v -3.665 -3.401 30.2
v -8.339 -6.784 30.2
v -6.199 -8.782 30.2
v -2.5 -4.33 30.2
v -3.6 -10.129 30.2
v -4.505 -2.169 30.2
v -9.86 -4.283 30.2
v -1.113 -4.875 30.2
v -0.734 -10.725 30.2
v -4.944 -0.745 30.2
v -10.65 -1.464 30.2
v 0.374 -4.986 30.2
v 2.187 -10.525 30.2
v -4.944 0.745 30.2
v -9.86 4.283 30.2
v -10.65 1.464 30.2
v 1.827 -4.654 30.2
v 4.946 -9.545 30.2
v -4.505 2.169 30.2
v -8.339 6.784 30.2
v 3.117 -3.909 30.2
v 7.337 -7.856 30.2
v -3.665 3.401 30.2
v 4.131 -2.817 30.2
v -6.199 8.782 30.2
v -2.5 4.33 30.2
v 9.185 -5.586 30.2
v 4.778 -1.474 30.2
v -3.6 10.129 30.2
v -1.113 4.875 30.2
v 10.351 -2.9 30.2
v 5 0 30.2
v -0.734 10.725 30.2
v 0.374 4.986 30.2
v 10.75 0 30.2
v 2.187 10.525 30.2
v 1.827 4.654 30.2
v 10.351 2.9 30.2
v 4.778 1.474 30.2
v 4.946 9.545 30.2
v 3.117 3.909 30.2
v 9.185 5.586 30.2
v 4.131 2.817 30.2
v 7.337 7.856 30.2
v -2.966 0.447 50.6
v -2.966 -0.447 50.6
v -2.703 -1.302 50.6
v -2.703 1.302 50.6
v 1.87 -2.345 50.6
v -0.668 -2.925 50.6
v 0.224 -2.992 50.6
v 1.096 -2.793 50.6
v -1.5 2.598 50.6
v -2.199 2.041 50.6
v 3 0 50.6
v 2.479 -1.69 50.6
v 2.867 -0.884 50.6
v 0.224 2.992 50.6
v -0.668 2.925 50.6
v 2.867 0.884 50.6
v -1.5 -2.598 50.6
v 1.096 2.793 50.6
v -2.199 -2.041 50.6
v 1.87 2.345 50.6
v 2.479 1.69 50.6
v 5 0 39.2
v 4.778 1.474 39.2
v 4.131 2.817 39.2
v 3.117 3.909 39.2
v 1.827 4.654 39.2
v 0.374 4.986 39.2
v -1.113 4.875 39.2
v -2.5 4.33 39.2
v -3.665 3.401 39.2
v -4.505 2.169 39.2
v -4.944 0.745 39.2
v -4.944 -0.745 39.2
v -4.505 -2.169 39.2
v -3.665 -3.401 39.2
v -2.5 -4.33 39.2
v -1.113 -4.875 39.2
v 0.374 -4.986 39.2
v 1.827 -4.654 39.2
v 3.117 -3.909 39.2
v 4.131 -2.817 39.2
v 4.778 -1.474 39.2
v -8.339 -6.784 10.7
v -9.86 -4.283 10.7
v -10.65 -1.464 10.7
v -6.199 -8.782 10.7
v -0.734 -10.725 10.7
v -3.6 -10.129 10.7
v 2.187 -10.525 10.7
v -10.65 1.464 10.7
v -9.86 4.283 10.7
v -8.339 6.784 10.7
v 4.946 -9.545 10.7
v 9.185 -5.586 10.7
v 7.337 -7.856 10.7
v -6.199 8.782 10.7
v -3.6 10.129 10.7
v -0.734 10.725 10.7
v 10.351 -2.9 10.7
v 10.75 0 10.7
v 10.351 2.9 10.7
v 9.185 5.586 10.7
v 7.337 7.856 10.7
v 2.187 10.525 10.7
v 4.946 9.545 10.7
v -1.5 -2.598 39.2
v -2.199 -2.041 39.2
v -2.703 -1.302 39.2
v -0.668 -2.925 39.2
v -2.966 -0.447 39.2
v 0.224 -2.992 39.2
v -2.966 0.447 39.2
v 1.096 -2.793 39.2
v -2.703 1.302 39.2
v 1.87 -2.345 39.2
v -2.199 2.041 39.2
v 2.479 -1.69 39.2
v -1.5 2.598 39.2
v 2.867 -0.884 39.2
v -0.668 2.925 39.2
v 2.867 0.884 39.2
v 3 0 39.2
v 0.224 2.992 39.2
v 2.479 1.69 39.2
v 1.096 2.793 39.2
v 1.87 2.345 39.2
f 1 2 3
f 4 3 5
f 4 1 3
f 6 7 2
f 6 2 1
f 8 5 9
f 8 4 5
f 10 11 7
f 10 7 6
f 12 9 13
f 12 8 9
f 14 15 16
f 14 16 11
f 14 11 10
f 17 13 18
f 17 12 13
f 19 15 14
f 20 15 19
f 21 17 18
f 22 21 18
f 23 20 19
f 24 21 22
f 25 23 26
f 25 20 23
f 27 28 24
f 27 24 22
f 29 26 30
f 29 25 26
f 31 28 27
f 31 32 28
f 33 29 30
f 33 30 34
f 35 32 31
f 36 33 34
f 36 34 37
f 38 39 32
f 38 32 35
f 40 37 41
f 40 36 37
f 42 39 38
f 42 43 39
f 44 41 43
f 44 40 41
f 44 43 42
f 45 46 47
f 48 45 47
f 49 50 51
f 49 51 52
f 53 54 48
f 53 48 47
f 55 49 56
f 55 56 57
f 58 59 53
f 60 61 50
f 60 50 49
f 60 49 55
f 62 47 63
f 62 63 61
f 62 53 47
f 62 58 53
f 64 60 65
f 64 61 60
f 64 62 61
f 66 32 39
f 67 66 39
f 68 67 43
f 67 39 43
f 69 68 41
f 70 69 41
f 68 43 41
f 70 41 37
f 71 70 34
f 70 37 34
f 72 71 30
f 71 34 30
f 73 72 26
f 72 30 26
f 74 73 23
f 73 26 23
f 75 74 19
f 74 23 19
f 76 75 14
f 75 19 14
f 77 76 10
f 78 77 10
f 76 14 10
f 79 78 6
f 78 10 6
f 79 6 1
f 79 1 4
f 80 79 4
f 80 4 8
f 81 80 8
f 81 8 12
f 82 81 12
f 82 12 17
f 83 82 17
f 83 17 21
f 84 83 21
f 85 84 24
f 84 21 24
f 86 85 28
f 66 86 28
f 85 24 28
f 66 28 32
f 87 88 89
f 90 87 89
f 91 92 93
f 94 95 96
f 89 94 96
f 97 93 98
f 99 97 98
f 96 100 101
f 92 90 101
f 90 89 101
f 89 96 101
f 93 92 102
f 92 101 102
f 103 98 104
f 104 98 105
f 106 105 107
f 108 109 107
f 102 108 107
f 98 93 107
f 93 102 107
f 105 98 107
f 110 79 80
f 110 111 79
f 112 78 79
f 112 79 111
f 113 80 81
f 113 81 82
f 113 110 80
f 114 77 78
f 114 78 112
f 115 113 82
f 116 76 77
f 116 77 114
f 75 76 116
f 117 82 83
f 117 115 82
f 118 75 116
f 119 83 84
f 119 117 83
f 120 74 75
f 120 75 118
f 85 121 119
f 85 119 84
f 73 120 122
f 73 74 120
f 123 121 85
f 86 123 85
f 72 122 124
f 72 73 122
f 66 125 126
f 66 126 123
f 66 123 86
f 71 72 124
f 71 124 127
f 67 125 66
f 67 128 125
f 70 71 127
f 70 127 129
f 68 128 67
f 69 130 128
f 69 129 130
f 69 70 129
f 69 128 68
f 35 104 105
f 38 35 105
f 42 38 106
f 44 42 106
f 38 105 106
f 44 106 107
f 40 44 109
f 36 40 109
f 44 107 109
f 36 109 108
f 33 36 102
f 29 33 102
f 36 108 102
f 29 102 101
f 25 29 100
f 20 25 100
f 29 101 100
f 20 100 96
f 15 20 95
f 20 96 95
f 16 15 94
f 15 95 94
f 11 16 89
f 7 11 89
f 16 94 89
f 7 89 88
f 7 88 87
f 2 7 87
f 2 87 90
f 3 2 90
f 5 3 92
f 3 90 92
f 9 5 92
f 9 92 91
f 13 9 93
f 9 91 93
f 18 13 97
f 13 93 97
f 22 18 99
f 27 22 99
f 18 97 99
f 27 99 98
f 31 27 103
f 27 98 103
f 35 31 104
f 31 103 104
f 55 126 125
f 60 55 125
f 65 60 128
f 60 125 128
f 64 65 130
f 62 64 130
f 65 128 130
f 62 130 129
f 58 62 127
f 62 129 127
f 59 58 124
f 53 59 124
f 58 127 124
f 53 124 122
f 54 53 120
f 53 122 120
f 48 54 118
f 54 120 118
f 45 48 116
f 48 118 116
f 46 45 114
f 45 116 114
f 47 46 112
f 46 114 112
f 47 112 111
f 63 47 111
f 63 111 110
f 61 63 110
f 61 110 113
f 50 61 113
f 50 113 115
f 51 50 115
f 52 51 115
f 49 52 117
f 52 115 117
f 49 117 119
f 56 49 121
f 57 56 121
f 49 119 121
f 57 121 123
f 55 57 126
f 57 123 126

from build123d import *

# Parameters (mm, degrees)
CYLINDER053_R     = 5
CYLINDER053_DEPTH = 9
CYLINDER054_R     = 3
CYLINDER054_DEPTH = 11.4
CYLINDER052_R     = 10.75
CYLINDER052_DEPTH = 19.5


with BuildPart() as pot_thread:
    # Cylinder053 → Cylinder053 (new body)
    with BuildSketch(Plane.XY.offset(19.5)):
        Circle(CYLINDER053_R)
    extrude(amount=CYLINDER053_DEPTH)


with BuildPart() as pot_axis:
    # Cylinder054 → Cylinder054 (new body)
    with BuildSketch(Plane.XY.offset(28.5)):
        Circle(CYLINDER054_R)
    extrude(amount=CYLINDER054_DEPTH)


with BuildPart() as pot_multiturn:
    # Cylinder052 → Cylinder052 (new body)
    with BuildSketch(Plane.XY):
        Circle(CYLINDER052_R)
    extrude(amount=CYLINDER052_DEPTH)

    # Fusion024: union pot-thread, pot-axis
    add(pot_thread.part)
    add(pot_axis.part)


with BuildPart() as pot_multiturn_1:
    # Fusion024 placement: moved
    add(pot_multiturn.part.moved(Location((0, 0, 10.7))))


solid = pot_multiturn_1.part
